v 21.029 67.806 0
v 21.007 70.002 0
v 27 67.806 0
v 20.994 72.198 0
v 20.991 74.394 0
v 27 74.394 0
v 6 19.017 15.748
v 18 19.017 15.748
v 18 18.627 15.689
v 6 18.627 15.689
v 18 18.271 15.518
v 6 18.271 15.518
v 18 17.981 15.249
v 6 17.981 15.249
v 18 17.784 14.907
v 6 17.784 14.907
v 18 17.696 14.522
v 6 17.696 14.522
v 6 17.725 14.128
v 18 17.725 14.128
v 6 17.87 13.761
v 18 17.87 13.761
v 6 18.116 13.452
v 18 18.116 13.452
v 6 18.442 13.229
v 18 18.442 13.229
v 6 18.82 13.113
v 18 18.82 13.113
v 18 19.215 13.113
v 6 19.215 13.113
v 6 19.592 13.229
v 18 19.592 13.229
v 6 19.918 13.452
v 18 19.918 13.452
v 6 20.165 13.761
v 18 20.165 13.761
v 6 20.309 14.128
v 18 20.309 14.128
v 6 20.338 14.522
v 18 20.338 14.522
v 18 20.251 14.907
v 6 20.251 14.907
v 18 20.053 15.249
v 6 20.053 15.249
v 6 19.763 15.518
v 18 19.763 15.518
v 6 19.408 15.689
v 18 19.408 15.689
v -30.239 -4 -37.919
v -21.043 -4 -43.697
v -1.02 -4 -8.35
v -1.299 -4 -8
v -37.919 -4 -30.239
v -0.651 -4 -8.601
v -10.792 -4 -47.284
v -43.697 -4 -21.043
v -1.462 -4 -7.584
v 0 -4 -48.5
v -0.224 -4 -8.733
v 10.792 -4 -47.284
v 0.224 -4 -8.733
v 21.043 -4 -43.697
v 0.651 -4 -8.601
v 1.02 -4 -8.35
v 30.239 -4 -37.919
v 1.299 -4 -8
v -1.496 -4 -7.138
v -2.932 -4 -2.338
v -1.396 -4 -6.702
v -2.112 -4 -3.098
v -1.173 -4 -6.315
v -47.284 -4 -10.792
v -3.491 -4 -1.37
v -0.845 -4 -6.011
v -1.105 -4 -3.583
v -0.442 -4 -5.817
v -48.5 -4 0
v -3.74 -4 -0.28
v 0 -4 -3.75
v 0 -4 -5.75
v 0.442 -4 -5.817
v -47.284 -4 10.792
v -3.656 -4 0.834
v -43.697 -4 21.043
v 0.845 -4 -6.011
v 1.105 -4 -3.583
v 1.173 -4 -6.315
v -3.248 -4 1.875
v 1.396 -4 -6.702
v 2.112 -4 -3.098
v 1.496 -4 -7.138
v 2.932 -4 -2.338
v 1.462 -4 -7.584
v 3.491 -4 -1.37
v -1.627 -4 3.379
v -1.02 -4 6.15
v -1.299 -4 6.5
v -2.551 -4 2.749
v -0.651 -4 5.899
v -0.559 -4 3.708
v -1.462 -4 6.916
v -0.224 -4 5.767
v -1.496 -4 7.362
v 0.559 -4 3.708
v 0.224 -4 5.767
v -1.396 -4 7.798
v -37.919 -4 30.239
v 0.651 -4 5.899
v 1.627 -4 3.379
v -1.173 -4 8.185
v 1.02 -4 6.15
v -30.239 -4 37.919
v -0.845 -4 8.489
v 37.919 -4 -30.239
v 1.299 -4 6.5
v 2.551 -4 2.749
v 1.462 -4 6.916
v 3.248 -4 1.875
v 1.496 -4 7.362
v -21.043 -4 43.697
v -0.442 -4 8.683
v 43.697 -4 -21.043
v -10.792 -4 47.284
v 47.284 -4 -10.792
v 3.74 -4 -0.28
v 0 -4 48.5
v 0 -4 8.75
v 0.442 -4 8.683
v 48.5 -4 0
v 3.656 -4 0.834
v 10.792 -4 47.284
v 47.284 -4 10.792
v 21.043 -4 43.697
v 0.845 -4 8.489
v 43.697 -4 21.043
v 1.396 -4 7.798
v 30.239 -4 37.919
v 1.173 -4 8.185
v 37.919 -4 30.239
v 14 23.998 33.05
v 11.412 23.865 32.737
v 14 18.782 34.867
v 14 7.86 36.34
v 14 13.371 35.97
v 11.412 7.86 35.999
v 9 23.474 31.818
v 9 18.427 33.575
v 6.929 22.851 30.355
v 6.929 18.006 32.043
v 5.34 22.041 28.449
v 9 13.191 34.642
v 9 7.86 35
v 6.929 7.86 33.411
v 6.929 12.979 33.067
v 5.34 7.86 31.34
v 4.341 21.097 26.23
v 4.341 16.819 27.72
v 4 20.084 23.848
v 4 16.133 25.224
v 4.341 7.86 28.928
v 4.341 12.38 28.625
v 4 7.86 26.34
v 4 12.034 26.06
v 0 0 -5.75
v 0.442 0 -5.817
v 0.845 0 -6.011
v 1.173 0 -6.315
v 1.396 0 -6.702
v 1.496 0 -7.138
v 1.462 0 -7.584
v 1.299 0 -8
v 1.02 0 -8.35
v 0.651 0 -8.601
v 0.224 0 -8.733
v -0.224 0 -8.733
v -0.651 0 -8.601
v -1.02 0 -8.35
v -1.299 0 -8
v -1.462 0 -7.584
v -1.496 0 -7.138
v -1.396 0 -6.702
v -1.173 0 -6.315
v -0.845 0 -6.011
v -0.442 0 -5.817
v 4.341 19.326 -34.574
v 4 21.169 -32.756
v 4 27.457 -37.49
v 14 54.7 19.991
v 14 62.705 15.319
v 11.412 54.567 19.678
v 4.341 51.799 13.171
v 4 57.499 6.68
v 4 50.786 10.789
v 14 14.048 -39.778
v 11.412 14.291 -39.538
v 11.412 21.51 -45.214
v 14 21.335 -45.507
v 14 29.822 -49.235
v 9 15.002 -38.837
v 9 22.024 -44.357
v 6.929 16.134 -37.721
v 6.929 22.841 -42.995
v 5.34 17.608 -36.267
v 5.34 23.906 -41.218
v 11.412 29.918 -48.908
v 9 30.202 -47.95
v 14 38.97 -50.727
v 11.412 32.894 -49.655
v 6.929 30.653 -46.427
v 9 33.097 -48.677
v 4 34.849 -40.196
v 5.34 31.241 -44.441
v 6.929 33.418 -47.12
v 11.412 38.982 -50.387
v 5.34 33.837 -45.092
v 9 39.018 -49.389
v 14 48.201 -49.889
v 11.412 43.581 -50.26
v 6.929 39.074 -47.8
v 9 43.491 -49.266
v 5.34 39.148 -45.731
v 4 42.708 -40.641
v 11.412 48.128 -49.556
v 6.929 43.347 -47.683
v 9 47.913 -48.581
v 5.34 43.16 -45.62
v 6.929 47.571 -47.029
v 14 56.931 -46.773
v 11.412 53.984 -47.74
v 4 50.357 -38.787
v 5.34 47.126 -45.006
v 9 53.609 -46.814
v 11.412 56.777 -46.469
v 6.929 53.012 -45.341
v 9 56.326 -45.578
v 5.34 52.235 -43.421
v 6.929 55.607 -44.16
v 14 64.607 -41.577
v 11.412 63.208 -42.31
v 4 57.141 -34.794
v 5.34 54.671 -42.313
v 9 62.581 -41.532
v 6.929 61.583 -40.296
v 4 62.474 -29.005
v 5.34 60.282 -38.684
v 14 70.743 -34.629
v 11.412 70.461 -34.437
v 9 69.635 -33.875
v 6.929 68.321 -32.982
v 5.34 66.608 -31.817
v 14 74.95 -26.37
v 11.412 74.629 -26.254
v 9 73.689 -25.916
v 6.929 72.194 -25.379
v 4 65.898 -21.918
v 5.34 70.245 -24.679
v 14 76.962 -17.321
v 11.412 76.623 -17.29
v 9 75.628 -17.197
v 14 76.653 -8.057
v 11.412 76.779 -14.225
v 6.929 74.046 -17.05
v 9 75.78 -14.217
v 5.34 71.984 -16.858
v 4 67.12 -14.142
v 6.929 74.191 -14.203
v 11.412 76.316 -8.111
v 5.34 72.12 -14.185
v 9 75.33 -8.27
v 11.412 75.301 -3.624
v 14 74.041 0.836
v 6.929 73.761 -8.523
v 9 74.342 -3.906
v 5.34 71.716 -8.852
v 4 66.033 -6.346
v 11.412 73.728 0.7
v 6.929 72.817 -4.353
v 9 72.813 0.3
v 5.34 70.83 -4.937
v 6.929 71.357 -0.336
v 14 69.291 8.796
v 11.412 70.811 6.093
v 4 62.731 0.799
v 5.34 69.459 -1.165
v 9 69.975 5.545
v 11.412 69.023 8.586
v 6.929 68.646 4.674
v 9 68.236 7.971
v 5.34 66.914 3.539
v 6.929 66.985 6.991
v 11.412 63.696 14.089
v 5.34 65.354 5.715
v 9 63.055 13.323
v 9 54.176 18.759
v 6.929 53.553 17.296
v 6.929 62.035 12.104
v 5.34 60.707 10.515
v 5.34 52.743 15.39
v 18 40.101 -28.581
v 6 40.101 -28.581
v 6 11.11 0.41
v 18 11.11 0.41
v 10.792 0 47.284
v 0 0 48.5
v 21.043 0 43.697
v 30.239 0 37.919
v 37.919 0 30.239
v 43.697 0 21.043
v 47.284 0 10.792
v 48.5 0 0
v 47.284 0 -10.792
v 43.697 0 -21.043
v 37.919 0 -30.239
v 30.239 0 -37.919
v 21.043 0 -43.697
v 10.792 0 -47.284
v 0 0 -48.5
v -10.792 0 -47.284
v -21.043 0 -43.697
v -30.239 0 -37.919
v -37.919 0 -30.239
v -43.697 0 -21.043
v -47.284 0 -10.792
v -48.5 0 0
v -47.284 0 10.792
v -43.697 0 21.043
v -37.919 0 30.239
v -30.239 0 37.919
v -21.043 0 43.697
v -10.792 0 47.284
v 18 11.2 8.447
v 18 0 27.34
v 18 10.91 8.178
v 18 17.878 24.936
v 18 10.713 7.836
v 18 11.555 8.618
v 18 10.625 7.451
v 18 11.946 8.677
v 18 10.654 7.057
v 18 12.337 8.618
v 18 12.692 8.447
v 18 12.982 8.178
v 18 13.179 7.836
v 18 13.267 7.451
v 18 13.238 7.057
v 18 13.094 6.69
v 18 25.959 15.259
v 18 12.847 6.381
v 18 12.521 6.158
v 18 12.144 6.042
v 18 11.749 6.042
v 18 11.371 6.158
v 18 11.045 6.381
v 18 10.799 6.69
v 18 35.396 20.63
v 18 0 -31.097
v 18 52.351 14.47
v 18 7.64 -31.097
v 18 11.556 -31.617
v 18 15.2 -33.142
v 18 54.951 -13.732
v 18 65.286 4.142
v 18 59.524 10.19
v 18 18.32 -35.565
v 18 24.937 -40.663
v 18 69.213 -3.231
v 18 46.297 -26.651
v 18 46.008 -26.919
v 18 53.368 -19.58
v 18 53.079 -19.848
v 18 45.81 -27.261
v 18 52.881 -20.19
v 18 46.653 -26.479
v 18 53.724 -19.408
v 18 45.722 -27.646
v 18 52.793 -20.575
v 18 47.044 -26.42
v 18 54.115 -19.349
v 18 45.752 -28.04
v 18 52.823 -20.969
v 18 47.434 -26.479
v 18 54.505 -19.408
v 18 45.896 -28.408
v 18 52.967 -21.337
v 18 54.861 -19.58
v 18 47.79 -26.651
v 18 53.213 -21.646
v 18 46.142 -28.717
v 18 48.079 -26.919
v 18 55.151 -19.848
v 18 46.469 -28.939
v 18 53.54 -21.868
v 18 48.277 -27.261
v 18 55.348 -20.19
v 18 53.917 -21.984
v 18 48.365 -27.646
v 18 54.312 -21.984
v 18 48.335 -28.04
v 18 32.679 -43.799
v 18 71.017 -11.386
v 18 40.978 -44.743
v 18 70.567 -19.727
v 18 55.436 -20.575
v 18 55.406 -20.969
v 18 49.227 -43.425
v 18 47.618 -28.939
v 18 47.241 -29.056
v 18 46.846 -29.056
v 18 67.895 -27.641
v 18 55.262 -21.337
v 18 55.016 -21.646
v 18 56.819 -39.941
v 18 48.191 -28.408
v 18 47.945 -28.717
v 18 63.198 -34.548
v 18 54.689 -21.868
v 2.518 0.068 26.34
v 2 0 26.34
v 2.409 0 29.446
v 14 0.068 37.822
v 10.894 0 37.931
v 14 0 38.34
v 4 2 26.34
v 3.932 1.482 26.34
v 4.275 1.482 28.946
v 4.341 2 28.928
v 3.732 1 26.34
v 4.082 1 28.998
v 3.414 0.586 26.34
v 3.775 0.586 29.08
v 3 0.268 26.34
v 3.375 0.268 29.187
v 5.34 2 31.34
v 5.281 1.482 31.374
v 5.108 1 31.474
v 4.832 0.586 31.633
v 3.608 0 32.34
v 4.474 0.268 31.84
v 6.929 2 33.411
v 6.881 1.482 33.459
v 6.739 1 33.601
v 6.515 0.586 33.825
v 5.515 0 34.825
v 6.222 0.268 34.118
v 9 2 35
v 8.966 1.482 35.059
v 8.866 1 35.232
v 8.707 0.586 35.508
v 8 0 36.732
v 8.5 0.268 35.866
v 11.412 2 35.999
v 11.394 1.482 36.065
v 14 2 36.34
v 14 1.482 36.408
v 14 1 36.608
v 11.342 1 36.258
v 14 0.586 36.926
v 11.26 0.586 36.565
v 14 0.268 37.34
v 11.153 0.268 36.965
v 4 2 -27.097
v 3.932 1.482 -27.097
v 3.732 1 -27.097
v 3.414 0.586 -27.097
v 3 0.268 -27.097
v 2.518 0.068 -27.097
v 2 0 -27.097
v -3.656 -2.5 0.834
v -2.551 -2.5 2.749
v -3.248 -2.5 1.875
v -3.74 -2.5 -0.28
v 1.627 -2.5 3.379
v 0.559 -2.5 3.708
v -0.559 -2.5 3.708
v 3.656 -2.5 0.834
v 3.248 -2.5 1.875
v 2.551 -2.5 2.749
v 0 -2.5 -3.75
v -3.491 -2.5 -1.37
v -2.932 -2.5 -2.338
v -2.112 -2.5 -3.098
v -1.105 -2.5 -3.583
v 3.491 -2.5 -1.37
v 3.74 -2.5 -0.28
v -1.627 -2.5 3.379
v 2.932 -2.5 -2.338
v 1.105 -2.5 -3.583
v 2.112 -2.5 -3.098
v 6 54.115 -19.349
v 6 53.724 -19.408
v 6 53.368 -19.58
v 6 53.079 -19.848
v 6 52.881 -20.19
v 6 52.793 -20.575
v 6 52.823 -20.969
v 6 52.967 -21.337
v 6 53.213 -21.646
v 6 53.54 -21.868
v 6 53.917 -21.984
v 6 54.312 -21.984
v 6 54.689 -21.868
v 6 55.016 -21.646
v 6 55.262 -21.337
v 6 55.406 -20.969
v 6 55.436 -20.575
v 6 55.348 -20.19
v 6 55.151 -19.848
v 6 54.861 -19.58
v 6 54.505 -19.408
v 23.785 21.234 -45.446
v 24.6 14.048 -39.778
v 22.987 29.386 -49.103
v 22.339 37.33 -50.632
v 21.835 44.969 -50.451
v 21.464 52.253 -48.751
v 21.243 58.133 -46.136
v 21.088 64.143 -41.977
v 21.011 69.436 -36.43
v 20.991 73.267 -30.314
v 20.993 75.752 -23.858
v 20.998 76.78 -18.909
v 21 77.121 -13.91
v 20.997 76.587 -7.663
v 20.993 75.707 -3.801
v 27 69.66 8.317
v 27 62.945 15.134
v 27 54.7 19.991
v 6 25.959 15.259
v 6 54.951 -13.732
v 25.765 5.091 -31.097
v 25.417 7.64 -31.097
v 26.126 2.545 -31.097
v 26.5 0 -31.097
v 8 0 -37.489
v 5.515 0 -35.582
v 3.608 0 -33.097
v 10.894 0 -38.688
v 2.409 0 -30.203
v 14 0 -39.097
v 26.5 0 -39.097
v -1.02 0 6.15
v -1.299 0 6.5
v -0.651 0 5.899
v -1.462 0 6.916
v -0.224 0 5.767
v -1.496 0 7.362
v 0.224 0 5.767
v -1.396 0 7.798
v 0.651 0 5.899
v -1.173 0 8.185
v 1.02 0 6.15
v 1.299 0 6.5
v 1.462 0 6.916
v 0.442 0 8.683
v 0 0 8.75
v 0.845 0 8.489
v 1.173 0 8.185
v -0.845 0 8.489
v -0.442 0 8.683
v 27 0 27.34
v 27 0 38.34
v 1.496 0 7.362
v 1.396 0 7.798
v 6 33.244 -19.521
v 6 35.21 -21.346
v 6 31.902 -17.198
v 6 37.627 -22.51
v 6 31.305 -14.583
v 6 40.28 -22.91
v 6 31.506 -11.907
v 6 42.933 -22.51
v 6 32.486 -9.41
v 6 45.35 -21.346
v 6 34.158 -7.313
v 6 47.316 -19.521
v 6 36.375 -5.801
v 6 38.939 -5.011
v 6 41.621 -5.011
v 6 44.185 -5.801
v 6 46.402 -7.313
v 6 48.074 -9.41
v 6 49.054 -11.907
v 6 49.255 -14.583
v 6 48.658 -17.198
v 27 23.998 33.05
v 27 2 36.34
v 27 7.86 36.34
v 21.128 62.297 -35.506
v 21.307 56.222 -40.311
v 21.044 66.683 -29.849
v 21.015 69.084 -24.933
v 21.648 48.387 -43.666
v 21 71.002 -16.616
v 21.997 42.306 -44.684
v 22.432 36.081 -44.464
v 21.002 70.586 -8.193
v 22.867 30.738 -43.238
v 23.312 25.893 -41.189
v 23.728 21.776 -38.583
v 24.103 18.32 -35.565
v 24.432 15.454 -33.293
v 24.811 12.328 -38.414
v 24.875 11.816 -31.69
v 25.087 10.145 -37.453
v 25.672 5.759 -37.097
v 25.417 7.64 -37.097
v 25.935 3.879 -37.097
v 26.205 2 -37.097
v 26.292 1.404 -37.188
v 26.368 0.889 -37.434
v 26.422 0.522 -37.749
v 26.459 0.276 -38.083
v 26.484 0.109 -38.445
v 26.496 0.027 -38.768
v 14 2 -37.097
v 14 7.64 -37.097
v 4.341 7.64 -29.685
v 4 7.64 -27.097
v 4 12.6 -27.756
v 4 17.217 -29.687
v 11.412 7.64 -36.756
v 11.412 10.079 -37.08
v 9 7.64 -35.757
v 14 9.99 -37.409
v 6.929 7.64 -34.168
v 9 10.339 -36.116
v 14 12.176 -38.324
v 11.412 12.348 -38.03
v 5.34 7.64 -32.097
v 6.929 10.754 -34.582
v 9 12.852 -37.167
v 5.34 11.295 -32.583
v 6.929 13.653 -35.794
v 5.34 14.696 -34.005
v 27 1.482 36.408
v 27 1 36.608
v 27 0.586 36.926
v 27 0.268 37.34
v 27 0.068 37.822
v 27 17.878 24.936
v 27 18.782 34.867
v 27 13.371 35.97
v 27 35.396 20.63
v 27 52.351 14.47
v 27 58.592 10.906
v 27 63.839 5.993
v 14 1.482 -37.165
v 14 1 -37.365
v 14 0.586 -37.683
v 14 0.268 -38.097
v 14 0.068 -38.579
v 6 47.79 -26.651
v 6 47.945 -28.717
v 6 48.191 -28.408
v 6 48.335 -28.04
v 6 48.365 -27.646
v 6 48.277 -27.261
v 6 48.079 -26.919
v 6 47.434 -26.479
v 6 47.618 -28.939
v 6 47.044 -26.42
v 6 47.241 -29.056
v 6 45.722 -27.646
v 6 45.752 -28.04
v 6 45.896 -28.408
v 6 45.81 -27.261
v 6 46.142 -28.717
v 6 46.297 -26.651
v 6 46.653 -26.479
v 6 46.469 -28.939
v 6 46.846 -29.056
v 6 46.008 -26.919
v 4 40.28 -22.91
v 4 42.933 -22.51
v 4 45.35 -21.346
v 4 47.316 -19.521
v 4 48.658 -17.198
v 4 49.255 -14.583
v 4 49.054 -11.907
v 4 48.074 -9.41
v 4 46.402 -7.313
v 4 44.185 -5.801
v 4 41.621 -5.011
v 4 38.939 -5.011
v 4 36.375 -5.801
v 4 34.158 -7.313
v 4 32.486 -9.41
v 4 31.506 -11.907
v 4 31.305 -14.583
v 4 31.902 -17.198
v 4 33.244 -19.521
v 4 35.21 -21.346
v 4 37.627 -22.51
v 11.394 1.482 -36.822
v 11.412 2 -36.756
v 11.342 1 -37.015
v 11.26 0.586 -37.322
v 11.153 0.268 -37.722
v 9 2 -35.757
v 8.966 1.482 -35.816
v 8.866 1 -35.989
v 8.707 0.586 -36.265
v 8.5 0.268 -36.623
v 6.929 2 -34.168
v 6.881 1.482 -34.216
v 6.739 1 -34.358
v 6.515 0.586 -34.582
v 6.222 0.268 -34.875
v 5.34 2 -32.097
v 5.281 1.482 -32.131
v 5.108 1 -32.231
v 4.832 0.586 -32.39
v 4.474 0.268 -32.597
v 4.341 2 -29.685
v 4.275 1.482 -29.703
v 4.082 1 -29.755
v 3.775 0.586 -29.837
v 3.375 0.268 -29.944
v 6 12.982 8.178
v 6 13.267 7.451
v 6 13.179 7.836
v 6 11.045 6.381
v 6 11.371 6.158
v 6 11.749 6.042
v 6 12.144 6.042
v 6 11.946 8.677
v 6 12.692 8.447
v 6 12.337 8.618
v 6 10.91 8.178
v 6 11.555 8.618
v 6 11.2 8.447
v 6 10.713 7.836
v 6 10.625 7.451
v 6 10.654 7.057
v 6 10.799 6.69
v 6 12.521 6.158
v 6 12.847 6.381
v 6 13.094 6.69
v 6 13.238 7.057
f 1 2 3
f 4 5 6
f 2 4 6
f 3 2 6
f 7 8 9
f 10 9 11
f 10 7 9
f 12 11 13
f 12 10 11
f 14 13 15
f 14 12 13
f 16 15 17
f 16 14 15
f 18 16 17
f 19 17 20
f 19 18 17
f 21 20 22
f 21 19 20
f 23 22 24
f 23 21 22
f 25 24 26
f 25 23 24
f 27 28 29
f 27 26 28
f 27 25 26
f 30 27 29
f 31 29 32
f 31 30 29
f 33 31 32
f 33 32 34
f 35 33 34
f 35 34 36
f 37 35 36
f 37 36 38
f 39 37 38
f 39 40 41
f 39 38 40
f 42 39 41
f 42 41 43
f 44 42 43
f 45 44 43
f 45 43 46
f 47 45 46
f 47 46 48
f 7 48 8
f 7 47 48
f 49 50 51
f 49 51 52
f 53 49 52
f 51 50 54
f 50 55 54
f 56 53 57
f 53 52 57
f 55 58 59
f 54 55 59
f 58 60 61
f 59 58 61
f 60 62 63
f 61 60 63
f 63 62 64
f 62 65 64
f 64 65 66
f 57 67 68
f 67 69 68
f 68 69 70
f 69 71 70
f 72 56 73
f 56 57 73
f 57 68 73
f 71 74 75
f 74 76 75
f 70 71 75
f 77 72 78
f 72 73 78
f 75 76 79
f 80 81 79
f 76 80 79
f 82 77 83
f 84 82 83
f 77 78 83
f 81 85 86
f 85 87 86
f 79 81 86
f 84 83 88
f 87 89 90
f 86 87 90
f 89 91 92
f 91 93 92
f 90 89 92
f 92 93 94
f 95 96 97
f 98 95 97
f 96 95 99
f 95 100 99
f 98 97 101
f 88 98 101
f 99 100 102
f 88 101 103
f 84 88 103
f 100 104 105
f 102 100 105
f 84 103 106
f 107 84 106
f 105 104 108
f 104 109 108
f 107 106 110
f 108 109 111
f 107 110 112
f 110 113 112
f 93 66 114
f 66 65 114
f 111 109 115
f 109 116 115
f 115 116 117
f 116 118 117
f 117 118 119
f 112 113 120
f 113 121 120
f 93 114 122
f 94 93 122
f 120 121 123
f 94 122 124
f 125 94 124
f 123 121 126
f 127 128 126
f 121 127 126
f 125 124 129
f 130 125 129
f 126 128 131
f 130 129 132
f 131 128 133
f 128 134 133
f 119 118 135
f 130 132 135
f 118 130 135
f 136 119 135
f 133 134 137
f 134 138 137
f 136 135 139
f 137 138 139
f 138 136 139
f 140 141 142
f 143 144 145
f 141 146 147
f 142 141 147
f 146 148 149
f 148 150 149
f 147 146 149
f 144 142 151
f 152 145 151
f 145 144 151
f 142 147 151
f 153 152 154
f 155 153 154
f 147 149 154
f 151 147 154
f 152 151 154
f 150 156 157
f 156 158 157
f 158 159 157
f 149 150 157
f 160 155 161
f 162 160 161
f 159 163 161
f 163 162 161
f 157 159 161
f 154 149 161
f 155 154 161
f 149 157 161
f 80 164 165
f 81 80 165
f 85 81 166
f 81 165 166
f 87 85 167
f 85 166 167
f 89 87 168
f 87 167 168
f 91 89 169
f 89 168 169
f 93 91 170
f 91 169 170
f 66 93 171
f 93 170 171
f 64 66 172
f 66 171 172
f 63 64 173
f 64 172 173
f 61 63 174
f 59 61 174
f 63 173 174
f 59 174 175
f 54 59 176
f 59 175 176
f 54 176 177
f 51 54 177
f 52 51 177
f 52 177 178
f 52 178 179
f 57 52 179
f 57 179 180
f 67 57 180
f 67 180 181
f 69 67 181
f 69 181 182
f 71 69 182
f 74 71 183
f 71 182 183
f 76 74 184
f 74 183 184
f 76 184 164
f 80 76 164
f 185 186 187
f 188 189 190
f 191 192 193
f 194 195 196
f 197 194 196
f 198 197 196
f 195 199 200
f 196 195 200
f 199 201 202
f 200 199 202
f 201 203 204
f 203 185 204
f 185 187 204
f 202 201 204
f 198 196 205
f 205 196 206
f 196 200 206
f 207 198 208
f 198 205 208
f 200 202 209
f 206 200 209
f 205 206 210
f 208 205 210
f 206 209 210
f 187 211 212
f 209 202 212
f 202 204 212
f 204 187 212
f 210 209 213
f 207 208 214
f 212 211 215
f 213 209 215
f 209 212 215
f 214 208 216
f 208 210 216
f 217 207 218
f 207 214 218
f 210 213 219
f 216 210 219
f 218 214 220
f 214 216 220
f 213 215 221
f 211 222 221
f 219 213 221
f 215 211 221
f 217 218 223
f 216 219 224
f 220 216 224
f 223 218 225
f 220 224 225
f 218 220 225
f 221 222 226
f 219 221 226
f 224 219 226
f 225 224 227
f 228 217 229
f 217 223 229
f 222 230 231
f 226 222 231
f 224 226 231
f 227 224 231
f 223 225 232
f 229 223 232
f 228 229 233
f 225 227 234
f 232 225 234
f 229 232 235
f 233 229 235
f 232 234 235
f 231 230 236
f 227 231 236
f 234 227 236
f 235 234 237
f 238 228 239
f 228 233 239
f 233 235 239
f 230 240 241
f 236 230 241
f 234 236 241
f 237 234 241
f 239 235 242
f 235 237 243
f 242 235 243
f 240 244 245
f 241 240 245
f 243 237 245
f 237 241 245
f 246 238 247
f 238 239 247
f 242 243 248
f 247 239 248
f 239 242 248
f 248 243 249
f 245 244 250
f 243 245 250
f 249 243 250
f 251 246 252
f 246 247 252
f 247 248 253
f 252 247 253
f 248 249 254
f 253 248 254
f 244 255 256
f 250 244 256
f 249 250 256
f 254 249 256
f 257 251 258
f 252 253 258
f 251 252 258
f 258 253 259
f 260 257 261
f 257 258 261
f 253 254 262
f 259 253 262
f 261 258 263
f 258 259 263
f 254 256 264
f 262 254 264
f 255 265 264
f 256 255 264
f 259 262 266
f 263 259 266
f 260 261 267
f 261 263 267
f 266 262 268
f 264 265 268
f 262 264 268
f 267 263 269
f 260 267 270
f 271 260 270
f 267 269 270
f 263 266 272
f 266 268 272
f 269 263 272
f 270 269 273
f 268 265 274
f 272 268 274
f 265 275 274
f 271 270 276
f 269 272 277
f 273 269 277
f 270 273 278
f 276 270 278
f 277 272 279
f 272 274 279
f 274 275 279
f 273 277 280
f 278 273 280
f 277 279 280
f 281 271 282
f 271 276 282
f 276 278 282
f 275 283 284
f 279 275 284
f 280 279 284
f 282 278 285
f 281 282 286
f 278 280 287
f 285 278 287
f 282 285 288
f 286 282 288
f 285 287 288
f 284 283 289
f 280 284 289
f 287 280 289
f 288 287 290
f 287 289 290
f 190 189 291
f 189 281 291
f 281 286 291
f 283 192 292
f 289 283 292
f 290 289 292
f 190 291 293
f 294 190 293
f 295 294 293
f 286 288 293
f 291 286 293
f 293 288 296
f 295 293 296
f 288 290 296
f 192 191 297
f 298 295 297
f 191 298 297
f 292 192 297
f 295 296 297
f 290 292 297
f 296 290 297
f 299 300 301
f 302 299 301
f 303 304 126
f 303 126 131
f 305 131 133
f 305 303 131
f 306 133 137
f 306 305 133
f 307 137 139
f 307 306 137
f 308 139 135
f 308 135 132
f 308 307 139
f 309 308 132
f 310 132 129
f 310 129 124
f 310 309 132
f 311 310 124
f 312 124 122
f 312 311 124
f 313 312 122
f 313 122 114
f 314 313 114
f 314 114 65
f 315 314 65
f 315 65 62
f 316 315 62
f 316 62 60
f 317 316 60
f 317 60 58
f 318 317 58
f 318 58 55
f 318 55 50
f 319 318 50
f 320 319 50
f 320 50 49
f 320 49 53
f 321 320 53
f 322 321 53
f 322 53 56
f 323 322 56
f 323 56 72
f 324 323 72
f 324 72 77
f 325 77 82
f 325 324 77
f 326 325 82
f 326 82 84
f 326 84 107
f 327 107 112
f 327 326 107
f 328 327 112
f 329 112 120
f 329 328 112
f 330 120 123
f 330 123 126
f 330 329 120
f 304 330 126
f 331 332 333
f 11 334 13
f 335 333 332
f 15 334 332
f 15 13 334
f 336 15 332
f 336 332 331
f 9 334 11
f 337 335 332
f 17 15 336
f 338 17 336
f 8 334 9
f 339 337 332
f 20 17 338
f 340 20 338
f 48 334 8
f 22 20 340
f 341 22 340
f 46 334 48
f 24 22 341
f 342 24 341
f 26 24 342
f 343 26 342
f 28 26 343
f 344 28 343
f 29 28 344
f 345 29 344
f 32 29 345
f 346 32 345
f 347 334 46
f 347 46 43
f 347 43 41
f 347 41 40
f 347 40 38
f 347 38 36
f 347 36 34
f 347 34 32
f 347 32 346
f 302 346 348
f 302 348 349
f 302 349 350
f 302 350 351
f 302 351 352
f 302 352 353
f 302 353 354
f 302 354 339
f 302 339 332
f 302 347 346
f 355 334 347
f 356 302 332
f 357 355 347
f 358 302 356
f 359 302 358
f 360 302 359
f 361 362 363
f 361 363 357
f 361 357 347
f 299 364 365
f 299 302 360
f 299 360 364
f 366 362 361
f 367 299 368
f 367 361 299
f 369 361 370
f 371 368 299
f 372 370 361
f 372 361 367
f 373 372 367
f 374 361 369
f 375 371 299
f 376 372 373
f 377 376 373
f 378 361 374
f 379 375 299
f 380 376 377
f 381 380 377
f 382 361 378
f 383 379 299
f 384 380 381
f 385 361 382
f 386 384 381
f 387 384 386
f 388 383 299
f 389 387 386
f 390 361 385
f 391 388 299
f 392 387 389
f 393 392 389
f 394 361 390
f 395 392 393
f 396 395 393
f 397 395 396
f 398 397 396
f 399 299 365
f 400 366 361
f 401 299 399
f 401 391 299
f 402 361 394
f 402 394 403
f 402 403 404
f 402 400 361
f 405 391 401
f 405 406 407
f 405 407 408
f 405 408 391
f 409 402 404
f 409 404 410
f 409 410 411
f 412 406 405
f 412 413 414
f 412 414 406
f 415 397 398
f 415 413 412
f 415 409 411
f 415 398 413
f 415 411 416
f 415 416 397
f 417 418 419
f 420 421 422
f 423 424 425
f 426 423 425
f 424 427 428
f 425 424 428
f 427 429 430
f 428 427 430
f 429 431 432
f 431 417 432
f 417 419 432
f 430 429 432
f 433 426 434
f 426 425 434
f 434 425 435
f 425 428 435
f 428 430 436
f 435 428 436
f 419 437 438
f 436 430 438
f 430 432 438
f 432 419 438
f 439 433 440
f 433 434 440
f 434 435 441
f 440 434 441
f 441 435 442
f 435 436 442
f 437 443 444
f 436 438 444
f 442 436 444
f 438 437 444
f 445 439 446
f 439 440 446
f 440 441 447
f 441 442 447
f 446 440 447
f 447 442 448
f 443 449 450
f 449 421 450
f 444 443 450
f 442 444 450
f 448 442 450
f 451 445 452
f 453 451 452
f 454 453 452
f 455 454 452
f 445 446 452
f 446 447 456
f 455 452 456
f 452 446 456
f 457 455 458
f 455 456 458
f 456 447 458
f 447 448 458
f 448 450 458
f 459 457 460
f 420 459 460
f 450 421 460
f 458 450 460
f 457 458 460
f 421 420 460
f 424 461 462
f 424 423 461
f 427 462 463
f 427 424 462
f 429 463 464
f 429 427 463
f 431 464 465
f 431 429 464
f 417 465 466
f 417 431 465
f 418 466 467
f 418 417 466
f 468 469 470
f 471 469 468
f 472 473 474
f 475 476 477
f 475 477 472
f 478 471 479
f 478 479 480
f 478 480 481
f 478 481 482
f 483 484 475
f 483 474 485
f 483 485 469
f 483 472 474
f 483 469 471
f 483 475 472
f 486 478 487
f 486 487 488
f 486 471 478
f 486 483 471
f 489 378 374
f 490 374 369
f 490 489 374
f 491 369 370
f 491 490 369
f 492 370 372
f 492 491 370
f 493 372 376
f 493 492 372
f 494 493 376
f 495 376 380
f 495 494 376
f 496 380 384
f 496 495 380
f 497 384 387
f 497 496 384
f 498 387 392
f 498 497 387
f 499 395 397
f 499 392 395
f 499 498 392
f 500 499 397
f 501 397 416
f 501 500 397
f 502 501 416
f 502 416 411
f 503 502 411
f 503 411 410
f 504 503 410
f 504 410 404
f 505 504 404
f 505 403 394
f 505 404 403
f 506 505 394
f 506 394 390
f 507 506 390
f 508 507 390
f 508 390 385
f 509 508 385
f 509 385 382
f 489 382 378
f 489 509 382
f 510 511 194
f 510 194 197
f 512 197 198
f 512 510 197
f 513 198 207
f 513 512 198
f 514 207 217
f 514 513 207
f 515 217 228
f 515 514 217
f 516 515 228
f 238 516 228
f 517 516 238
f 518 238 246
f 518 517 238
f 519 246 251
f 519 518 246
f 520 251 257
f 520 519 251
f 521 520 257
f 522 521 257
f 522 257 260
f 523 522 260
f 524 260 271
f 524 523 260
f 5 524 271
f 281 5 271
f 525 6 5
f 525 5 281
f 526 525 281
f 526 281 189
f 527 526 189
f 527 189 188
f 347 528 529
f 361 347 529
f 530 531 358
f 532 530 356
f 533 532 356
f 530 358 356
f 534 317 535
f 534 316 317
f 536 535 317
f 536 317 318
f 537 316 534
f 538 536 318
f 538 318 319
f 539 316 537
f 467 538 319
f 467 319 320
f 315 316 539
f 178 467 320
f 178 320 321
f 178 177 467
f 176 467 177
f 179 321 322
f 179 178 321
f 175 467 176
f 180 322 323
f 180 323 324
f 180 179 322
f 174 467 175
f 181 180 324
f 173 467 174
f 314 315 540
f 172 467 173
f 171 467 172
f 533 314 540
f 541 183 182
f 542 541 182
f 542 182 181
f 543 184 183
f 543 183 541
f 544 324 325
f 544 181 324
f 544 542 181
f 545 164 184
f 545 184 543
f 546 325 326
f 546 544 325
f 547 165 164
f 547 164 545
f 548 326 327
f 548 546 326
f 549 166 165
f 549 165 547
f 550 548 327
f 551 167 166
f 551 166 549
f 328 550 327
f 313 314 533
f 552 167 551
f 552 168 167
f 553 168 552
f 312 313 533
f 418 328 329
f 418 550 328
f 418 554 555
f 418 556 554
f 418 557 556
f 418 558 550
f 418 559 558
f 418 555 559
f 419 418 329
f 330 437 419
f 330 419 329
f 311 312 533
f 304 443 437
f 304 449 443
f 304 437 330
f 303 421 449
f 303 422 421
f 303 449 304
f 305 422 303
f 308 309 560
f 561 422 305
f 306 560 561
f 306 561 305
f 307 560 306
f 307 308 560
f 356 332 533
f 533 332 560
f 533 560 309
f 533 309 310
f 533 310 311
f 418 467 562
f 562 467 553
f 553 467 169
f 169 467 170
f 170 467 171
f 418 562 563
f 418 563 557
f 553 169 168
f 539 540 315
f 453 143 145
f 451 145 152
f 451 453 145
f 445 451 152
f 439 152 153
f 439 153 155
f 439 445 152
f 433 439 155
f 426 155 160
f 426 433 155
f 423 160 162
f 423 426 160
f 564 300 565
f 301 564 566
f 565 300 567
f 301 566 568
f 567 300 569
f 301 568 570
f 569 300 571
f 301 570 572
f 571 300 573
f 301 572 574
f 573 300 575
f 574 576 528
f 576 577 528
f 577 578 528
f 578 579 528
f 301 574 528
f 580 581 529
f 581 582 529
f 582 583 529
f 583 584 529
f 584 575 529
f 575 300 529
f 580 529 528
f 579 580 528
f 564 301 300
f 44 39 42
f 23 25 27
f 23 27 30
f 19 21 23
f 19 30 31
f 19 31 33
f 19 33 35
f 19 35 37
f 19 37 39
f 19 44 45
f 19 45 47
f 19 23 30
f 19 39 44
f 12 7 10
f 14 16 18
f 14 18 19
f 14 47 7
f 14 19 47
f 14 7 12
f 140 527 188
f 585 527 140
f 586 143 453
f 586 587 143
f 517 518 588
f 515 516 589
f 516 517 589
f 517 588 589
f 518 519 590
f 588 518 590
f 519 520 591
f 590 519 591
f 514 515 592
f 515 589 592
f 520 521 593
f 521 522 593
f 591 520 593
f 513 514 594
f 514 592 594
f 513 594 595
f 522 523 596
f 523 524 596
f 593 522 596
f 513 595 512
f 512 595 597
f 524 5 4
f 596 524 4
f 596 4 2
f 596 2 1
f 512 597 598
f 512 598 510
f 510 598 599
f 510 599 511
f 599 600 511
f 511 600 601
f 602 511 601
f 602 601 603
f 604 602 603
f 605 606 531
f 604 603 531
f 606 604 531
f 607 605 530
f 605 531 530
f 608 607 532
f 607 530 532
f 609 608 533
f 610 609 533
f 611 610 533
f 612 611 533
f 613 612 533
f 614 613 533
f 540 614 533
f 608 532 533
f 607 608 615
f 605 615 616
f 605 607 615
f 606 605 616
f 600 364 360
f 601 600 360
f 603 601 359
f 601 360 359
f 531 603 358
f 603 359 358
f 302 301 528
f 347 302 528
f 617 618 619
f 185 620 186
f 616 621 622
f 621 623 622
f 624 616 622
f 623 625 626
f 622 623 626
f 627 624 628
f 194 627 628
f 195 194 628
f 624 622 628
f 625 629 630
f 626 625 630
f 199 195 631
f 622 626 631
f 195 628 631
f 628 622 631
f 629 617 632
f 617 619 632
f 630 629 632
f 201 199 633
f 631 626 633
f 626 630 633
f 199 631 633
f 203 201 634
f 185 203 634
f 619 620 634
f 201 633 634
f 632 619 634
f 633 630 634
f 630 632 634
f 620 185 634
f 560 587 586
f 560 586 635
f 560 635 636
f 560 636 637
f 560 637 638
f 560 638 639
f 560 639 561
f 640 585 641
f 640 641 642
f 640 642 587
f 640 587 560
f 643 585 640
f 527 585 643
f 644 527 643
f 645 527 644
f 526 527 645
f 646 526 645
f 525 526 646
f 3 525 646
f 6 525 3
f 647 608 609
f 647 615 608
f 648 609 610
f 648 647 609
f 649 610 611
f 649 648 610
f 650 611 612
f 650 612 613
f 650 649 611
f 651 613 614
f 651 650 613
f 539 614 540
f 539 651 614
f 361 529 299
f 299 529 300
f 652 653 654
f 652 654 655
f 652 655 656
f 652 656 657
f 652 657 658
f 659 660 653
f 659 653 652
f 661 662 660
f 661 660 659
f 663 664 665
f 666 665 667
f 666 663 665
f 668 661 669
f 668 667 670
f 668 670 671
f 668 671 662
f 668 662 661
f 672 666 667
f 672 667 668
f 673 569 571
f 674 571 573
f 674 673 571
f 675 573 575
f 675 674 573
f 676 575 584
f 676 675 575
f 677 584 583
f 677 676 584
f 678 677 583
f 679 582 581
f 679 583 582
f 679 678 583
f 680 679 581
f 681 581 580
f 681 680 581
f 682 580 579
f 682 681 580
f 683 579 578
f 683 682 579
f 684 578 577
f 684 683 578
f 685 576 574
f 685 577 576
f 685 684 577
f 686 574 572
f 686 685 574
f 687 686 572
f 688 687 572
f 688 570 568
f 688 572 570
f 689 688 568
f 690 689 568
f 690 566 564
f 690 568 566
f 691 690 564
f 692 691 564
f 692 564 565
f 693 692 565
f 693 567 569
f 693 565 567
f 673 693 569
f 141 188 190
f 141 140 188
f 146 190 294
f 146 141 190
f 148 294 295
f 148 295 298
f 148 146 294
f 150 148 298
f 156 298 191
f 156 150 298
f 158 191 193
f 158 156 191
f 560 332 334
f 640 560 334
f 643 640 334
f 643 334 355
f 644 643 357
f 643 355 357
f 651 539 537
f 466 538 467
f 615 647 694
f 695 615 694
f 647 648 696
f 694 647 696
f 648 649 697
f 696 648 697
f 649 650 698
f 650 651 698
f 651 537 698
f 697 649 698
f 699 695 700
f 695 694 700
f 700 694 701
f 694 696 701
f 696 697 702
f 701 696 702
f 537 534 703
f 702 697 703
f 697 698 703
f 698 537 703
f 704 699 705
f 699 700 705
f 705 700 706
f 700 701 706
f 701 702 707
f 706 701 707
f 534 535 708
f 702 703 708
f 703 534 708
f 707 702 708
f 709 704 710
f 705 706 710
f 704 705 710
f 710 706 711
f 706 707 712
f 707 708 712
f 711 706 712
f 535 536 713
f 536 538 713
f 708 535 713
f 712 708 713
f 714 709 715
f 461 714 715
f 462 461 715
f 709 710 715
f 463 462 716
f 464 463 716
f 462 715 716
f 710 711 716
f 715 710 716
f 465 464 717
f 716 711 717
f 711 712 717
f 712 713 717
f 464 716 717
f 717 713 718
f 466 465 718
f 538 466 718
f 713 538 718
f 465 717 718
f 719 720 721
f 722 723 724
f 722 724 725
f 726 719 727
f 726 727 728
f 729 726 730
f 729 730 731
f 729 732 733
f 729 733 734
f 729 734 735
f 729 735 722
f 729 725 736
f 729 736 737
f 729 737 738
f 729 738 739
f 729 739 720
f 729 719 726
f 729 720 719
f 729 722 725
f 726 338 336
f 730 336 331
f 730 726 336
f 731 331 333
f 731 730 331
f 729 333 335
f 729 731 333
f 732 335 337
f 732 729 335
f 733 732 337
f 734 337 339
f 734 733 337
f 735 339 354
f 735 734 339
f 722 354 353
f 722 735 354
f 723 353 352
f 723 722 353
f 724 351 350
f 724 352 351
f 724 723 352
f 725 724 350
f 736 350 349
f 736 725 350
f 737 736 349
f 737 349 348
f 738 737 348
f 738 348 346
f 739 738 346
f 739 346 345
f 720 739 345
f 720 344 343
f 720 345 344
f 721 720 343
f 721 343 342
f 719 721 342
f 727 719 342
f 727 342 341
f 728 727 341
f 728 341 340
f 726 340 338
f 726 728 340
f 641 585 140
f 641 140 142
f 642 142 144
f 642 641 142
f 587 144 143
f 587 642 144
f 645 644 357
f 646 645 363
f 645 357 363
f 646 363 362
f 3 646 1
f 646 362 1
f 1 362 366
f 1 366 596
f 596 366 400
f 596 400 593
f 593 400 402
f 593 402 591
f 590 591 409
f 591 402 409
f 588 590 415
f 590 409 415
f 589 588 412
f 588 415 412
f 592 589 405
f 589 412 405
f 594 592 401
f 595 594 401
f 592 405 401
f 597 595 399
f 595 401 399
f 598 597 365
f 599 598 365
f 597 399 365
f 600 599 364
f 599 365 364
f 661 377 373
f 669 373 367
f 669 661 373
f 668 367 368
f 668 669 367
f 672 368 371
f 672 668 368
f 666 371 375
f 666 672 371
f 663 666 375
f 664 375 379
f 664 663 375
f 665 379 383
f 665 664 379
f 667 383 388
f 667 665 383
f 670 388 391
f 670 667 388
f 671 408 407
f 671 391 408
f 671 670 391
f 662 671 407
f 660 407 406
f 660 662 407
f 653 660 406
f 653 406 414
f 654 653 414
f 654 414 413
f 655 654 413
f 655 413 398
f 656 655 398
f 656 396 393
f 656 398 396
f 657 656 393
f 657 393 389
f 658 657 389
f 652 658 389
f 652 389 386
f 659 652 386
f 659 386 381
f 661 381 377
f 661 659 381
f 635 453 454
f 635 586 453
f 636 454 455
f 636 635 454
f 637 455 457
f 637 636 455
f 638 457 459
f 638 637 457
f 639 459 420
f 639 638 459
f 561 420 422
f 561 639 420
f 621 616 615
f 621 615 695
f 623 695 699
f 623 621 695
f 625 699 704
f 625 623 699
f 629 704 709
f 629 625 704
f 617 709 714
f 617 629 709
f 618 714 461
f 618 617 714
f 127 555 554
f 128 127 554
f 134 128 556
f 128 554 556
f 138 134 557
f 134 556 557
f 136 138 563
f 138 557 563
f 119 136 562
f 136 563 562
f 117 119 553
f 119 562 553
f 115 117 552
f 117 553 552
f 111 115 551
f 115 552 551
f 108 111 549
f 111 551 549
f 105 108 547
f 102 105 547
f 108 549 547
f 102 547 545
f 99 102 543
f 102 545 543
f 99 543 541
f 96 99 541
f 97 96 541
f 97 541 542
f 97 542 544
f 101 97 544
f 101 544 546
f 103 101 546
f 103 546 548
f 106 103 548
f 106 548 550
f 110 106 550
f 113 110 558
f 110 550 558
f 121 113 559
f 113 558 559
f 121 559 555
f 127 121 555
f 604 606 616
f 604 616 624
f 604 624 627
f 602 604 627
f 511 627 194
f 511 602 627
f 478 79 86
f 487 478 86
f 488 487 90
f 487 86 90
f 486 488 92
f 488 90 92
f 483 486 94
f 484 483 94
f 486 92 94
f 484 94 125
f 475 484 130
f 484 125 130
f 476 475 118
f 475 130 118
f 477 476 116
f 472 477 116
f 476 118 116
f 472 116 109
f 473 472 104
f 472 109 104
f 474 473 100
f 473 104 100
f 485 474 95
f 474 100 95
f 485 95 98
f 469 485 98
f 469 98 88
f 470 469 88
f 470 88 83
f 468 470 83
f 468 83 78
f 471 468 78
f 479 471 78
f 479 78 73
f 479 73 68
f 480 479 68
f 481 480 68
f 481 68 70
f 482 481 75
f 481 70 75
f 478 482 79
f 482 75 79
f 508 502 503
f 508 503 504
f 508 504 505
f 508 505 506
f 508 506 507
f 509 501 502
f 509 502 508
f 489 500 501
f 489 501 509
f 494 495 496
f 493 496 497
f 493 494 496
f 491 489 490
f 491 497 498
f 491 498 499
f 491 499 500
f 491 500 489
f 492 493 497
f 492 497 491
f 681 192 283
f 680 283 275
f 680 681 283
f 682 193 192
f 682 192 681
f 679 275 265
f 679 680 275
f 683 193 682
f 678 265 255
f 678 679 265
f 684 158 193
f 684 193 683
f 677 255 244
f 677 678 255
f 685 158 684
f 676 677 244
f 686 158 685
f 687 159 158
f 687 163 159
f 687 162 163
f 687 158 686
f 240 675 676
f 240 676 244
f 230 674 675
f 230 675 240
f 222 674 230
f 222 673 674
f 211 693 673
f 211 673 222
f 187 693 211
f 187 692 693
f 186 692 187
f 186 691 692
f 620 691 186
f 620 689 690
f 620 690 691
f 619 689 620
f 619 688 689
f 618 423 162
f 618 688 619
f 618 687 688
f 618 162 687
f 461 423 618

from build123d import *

# Parameters (mm, degrees)
SKETCH2_R                       = 48.5
SKETCH2_R_2                     = 1.5
BOSS_EXTRUDE1_DEPTH             = 4
SKETCH3_R                       = 3.75
CUT_EXTRUDE1_DEPTH              = 1.5
BOSS_EXTRUDE2_START             = 4
SKETCH4_R                       = 9
BOSS_EXTRUDE2_DEPTH             = 14
CUT_EXTRUDE2_START              = 6
SKETCH6_R                       = 1.325
CUT_EXTRUDE2_DEPTH              = 93.806192047
BOSS_EXTRUDE3_DEPTH             = 9
BOSS_EXTRUDE3_DIRECTION_2_REACH = 110.778
CUT_EXTRUDE3_DEPTH              = 105.285680763
FILLET1_R                       = 10
FILLET2_R                       = 2


with BuildPart() as part:
    # Sketch2 → Boss-Extrude1 (new body)
    with BuildSketch(Plane(origin=(0, 0, 0), x_dir=(1, 0, 0), z_dir=(0, 1, 0))):
        with Locations(Location((0, 0, 0), (0, 0, 270))):
            Circle(SKETCH2_R)
        with Locations(Location((0, 7.25, 0), (0, 0, 270))):
            Circle(SKETCH2_R_2, mode=Mode.SUBTRACT)
        with Locations(Location((0, -7.25, 0), (0, 0, 270))):
            Circle(SKETCH2_R_2, mode=Mode.SUBTRACT)
    extrude(amount=-BOSS_EXTRUDE1_DEPTH)

    # Sketch3 → Cut-Extrude1 (cut)
    with BuildSketch(Plane(origin=(0, -4, 0), x_dir=(-1, 0, 0), z_dir=(0, -1, 0))):
        with Locations(Location((0, 0, 0), (0, 0, 90))):
            Circle(SKETCH3_R)
    extrude(amount=-CUT_EXTRUDE1_DEPTH, mode=Mode.SUBTRACT)

    # Sketch4 → Boss-Extrude2 (add)
    with BuildSketch(Plane(origin=(0, 0, 0), x_dir=(0, 0, -1), z_dir=(1, 0, 0)).offset(BOSS_EXTRUDE2_START)):
        with BuildLine():
            Line((-14.470153899, 52.351446146), (-27.529193782, 21.649444314))
            ThreePointArc((-27.529193782, 21.649444314), (-29.630146994, 14.89650137), (-30.34, 7.86))
            Line((-30.34, 7.86), (-30.34, 0))
            Line((-30.34, 0), (31.097052925, 0))
            Line((31.097052925, 0), (31.097052925, 7.64))
            ThreePointArc((31.097052925, 7.64), (32.258997722, 13.428629218), (35.564816687, 18.320449421))
            ThreePointArc((35.564816687, 18.320449421), (31.254587763, 65.781337665), (-14.470153899, 52.351446146))
        make_face()
        with Locations((13.91, 40.28)):
            Circle(SKETCH4_R, mode=Mode.SUBTRACT)
    extrude(amount=BOSS_EXTRUDE2_DEPTH)

    # Sketch6 → Cut-Extrude2 (cut, through all)
    with BuildSketch(Plane(origin=(0, 0, 0), x_dir=(0, 0, -1), z_dir=(1, 0, 0)).offset(CUT_EXTRUDE2_START)):
        with Locations(Location((20.674280786, 54.114591003, 0), (0, 0, 180))):
            Circle(SKETCH6_R)
        with Locations(Location((27.745348598, 47.043523191, 0), (0, 0, 180))):
            Circle(SKETCH6_R)
        with Locations(Location((-7.352145163, 11.94602943, 0), (0, 0, 180))):
            Circle(SKETCH6_R)
        with Locations(Location((-14.423212974, 19.017097242, 0), (0, 0, 180))):
            Circle(SKETCH6_R)
        Polygon((-0.41, 11.11), (-15.259242405, 25.959242405), (13.732135624, 54.950620434), (28.581378029, 40.101378029), align=None)
    extrude(amount=CUT_EXTRUDE2_DEPTH, mode=Mode.SUBTRACT)

    # Sketch8 → Boss-Extrude3 (add)
    with BuildSketch(Plane(origin=(18, 0, 0), x_dir=(0, 0, -1), z_dir=(1, 0, 0))):
        with BuildLine():
            Line((37.097052925, 0), (37.097052925, 7.64))
            ThreePointArc((37.097052925, 7.64), (37.794219803, 11.113177531), (39.777711182, 14.048269653))
            ThreePointArc((39.777711182, 14.048269653), (34.628937191, 70.742563919), (-19.991447191, 54.69991807))
            Line((-19.991447191, 54.69991807), (-33.050487075, 23.997916239))
            ThreePointArc((-33.050487075, 23.997916239), (-35.509252358, 16.094883664), (-36.34, 7.86))
            Line((-36.34, 7.86), (-36.34, 0))
            Line((-36.34, 0), (-27.34, 0))
            ThreePointArc((-27.34, 0), (-23.018237165, 26.695212958), (-14.470153899, 52.351446146))
            ThreePointArc((-14.470153899, 52.351446146), (31.254587763, 65.781337665), (35.564816687, 18.320449421))
            ThreePointArc((35.564816687, 18.320449421), (32.258997722, 13.428629218), (31.097052925, 7.64))
            Line((31.097052925, 7.64), (31.097052925, 0))
            Line((31.097052925, 0), (37.097052925, 0))
        make_face()
    extrude(amount=BOSS_EXTRUDE3_DEPTH)

    # Boss-Extrude3 direction 2: up to this face of the body (flat: up to its plane)
    boss_extrude3_direction_2_end = Plane(part.part.faces().sort_by_distance((4, 32.037892767, -8.057594293))[0])
    # Sketch8 → Boss-Extrude3 direction 2 (add, up to the picked face)
    with BuildSketch(Plane(origin=(18, 0, 0), x_dir=(0, 0, -1), z_dir=(1, 0, 0)), mode=Mode.PRIVATE) as boss_extrude3_direction_2_sk1:
        with BuildLine():
            Line((37.097052925, 0), (37.097052925, 7.64))
            ThreePointArc((37.097052925, 7.64), (37.794219803, 11.113177531), (39.777711182, 14.048269653))
            ThreePointArc((39.777711182, 14.048269653), (34.628937191, 70.742563919), (-19.991447191, 54.69991807))
            Line((-19.991447191, 54.69991807), (-33.050487075, 23.997916239))
            ThreePointArc((-33.050487075, 23.997916239), (-35.509252358, 16.094883664), (-36.34, 7.86))
            Line((-36.34, 7.86), (-36.34, 0))
            Line((-36.34, 0), (-27.34, 0))
            ThreePointArc((-27.34, 0), (-23.018237165, 26.695212958), (-14.470153899, 52.351446146))
            ThreePointArc((-14.470153899, 52.351446146), (31.254587763, 65.781337665), (35.564816687, 18.320449421))
            ThreePointArc((35.564816687, 18.320449421), (32.258997722, 13.428629218), (31.097052925, 7.64))
            Line((31.097052925, 7.64), (31.097052925, 0))
            Line((31.097052925, 0), (37.097052925, 0))
        make_face()
    boss_extrude3_direction_2_tool1 = split(extrude(boss_extrude3_direction_2_sk1.sketch, amount=-BOSS_EXTRUDE3_DIRECTION_2_REACH, mode=Mode.PRIVATE), bisect_by=boss_extrude3_direction_2_end, keep=Keep.BOTH, mode=Mode.PRIVATE)
    add(boss_extrude3_direction_2_tool1.solids().sort_by(Axis((18, 66.743228, -31.908812), (-1, 0, 0)))[0])

    # Sketch9 → Cut-Extrude3 (cut, through all)
    with BuildSketch(Plane.XY):
        with BuildLine():
            Line((27, 77.12076762), (21, 77.12076762))
            ThreePointArc((21, 77.12076762), (22.257085893, 38.453914076), (26.5, 0))
            Line((26.5, 0), (27, 0))
            Line((27, 0), (27, 77.12076762))
        make_face()
    extrude(amount=-CUT_EXTRUDE3_DEPTH, mode=Mode.SUBTRACT)

    # Fillet1
    fillet1_edges = [part.edges().sort_by_distance(p)[0] for p in [
        (4, 3.82, -37.097052925),
        (4, 11.113177531, -37.794219803),
        (4, 70.742563919, -34.628937191),
        (4, 39.348917154, 26.520967133),
        (4, 16.094883664, 35.509252358),
        (4, 3.93, 36.34),
    ]]
    fillet(fillet1_edges, radius=FILLET1_R)

    # Fillet2
    fillet2_edges = [part.edges().sort_by_distance(p)[0] for p in [
        (20.25, 0, -37.097052925),
        (4, 0, -0.378526462),
        (20.5, 0, 36.34),
        (6.928932188, 0, -34.168120736),
        (6.928932188, 0, 33.411067812),
    ]]
    fillet(fillet2_edges, radius=FILLET2_R)


solid = part.part
